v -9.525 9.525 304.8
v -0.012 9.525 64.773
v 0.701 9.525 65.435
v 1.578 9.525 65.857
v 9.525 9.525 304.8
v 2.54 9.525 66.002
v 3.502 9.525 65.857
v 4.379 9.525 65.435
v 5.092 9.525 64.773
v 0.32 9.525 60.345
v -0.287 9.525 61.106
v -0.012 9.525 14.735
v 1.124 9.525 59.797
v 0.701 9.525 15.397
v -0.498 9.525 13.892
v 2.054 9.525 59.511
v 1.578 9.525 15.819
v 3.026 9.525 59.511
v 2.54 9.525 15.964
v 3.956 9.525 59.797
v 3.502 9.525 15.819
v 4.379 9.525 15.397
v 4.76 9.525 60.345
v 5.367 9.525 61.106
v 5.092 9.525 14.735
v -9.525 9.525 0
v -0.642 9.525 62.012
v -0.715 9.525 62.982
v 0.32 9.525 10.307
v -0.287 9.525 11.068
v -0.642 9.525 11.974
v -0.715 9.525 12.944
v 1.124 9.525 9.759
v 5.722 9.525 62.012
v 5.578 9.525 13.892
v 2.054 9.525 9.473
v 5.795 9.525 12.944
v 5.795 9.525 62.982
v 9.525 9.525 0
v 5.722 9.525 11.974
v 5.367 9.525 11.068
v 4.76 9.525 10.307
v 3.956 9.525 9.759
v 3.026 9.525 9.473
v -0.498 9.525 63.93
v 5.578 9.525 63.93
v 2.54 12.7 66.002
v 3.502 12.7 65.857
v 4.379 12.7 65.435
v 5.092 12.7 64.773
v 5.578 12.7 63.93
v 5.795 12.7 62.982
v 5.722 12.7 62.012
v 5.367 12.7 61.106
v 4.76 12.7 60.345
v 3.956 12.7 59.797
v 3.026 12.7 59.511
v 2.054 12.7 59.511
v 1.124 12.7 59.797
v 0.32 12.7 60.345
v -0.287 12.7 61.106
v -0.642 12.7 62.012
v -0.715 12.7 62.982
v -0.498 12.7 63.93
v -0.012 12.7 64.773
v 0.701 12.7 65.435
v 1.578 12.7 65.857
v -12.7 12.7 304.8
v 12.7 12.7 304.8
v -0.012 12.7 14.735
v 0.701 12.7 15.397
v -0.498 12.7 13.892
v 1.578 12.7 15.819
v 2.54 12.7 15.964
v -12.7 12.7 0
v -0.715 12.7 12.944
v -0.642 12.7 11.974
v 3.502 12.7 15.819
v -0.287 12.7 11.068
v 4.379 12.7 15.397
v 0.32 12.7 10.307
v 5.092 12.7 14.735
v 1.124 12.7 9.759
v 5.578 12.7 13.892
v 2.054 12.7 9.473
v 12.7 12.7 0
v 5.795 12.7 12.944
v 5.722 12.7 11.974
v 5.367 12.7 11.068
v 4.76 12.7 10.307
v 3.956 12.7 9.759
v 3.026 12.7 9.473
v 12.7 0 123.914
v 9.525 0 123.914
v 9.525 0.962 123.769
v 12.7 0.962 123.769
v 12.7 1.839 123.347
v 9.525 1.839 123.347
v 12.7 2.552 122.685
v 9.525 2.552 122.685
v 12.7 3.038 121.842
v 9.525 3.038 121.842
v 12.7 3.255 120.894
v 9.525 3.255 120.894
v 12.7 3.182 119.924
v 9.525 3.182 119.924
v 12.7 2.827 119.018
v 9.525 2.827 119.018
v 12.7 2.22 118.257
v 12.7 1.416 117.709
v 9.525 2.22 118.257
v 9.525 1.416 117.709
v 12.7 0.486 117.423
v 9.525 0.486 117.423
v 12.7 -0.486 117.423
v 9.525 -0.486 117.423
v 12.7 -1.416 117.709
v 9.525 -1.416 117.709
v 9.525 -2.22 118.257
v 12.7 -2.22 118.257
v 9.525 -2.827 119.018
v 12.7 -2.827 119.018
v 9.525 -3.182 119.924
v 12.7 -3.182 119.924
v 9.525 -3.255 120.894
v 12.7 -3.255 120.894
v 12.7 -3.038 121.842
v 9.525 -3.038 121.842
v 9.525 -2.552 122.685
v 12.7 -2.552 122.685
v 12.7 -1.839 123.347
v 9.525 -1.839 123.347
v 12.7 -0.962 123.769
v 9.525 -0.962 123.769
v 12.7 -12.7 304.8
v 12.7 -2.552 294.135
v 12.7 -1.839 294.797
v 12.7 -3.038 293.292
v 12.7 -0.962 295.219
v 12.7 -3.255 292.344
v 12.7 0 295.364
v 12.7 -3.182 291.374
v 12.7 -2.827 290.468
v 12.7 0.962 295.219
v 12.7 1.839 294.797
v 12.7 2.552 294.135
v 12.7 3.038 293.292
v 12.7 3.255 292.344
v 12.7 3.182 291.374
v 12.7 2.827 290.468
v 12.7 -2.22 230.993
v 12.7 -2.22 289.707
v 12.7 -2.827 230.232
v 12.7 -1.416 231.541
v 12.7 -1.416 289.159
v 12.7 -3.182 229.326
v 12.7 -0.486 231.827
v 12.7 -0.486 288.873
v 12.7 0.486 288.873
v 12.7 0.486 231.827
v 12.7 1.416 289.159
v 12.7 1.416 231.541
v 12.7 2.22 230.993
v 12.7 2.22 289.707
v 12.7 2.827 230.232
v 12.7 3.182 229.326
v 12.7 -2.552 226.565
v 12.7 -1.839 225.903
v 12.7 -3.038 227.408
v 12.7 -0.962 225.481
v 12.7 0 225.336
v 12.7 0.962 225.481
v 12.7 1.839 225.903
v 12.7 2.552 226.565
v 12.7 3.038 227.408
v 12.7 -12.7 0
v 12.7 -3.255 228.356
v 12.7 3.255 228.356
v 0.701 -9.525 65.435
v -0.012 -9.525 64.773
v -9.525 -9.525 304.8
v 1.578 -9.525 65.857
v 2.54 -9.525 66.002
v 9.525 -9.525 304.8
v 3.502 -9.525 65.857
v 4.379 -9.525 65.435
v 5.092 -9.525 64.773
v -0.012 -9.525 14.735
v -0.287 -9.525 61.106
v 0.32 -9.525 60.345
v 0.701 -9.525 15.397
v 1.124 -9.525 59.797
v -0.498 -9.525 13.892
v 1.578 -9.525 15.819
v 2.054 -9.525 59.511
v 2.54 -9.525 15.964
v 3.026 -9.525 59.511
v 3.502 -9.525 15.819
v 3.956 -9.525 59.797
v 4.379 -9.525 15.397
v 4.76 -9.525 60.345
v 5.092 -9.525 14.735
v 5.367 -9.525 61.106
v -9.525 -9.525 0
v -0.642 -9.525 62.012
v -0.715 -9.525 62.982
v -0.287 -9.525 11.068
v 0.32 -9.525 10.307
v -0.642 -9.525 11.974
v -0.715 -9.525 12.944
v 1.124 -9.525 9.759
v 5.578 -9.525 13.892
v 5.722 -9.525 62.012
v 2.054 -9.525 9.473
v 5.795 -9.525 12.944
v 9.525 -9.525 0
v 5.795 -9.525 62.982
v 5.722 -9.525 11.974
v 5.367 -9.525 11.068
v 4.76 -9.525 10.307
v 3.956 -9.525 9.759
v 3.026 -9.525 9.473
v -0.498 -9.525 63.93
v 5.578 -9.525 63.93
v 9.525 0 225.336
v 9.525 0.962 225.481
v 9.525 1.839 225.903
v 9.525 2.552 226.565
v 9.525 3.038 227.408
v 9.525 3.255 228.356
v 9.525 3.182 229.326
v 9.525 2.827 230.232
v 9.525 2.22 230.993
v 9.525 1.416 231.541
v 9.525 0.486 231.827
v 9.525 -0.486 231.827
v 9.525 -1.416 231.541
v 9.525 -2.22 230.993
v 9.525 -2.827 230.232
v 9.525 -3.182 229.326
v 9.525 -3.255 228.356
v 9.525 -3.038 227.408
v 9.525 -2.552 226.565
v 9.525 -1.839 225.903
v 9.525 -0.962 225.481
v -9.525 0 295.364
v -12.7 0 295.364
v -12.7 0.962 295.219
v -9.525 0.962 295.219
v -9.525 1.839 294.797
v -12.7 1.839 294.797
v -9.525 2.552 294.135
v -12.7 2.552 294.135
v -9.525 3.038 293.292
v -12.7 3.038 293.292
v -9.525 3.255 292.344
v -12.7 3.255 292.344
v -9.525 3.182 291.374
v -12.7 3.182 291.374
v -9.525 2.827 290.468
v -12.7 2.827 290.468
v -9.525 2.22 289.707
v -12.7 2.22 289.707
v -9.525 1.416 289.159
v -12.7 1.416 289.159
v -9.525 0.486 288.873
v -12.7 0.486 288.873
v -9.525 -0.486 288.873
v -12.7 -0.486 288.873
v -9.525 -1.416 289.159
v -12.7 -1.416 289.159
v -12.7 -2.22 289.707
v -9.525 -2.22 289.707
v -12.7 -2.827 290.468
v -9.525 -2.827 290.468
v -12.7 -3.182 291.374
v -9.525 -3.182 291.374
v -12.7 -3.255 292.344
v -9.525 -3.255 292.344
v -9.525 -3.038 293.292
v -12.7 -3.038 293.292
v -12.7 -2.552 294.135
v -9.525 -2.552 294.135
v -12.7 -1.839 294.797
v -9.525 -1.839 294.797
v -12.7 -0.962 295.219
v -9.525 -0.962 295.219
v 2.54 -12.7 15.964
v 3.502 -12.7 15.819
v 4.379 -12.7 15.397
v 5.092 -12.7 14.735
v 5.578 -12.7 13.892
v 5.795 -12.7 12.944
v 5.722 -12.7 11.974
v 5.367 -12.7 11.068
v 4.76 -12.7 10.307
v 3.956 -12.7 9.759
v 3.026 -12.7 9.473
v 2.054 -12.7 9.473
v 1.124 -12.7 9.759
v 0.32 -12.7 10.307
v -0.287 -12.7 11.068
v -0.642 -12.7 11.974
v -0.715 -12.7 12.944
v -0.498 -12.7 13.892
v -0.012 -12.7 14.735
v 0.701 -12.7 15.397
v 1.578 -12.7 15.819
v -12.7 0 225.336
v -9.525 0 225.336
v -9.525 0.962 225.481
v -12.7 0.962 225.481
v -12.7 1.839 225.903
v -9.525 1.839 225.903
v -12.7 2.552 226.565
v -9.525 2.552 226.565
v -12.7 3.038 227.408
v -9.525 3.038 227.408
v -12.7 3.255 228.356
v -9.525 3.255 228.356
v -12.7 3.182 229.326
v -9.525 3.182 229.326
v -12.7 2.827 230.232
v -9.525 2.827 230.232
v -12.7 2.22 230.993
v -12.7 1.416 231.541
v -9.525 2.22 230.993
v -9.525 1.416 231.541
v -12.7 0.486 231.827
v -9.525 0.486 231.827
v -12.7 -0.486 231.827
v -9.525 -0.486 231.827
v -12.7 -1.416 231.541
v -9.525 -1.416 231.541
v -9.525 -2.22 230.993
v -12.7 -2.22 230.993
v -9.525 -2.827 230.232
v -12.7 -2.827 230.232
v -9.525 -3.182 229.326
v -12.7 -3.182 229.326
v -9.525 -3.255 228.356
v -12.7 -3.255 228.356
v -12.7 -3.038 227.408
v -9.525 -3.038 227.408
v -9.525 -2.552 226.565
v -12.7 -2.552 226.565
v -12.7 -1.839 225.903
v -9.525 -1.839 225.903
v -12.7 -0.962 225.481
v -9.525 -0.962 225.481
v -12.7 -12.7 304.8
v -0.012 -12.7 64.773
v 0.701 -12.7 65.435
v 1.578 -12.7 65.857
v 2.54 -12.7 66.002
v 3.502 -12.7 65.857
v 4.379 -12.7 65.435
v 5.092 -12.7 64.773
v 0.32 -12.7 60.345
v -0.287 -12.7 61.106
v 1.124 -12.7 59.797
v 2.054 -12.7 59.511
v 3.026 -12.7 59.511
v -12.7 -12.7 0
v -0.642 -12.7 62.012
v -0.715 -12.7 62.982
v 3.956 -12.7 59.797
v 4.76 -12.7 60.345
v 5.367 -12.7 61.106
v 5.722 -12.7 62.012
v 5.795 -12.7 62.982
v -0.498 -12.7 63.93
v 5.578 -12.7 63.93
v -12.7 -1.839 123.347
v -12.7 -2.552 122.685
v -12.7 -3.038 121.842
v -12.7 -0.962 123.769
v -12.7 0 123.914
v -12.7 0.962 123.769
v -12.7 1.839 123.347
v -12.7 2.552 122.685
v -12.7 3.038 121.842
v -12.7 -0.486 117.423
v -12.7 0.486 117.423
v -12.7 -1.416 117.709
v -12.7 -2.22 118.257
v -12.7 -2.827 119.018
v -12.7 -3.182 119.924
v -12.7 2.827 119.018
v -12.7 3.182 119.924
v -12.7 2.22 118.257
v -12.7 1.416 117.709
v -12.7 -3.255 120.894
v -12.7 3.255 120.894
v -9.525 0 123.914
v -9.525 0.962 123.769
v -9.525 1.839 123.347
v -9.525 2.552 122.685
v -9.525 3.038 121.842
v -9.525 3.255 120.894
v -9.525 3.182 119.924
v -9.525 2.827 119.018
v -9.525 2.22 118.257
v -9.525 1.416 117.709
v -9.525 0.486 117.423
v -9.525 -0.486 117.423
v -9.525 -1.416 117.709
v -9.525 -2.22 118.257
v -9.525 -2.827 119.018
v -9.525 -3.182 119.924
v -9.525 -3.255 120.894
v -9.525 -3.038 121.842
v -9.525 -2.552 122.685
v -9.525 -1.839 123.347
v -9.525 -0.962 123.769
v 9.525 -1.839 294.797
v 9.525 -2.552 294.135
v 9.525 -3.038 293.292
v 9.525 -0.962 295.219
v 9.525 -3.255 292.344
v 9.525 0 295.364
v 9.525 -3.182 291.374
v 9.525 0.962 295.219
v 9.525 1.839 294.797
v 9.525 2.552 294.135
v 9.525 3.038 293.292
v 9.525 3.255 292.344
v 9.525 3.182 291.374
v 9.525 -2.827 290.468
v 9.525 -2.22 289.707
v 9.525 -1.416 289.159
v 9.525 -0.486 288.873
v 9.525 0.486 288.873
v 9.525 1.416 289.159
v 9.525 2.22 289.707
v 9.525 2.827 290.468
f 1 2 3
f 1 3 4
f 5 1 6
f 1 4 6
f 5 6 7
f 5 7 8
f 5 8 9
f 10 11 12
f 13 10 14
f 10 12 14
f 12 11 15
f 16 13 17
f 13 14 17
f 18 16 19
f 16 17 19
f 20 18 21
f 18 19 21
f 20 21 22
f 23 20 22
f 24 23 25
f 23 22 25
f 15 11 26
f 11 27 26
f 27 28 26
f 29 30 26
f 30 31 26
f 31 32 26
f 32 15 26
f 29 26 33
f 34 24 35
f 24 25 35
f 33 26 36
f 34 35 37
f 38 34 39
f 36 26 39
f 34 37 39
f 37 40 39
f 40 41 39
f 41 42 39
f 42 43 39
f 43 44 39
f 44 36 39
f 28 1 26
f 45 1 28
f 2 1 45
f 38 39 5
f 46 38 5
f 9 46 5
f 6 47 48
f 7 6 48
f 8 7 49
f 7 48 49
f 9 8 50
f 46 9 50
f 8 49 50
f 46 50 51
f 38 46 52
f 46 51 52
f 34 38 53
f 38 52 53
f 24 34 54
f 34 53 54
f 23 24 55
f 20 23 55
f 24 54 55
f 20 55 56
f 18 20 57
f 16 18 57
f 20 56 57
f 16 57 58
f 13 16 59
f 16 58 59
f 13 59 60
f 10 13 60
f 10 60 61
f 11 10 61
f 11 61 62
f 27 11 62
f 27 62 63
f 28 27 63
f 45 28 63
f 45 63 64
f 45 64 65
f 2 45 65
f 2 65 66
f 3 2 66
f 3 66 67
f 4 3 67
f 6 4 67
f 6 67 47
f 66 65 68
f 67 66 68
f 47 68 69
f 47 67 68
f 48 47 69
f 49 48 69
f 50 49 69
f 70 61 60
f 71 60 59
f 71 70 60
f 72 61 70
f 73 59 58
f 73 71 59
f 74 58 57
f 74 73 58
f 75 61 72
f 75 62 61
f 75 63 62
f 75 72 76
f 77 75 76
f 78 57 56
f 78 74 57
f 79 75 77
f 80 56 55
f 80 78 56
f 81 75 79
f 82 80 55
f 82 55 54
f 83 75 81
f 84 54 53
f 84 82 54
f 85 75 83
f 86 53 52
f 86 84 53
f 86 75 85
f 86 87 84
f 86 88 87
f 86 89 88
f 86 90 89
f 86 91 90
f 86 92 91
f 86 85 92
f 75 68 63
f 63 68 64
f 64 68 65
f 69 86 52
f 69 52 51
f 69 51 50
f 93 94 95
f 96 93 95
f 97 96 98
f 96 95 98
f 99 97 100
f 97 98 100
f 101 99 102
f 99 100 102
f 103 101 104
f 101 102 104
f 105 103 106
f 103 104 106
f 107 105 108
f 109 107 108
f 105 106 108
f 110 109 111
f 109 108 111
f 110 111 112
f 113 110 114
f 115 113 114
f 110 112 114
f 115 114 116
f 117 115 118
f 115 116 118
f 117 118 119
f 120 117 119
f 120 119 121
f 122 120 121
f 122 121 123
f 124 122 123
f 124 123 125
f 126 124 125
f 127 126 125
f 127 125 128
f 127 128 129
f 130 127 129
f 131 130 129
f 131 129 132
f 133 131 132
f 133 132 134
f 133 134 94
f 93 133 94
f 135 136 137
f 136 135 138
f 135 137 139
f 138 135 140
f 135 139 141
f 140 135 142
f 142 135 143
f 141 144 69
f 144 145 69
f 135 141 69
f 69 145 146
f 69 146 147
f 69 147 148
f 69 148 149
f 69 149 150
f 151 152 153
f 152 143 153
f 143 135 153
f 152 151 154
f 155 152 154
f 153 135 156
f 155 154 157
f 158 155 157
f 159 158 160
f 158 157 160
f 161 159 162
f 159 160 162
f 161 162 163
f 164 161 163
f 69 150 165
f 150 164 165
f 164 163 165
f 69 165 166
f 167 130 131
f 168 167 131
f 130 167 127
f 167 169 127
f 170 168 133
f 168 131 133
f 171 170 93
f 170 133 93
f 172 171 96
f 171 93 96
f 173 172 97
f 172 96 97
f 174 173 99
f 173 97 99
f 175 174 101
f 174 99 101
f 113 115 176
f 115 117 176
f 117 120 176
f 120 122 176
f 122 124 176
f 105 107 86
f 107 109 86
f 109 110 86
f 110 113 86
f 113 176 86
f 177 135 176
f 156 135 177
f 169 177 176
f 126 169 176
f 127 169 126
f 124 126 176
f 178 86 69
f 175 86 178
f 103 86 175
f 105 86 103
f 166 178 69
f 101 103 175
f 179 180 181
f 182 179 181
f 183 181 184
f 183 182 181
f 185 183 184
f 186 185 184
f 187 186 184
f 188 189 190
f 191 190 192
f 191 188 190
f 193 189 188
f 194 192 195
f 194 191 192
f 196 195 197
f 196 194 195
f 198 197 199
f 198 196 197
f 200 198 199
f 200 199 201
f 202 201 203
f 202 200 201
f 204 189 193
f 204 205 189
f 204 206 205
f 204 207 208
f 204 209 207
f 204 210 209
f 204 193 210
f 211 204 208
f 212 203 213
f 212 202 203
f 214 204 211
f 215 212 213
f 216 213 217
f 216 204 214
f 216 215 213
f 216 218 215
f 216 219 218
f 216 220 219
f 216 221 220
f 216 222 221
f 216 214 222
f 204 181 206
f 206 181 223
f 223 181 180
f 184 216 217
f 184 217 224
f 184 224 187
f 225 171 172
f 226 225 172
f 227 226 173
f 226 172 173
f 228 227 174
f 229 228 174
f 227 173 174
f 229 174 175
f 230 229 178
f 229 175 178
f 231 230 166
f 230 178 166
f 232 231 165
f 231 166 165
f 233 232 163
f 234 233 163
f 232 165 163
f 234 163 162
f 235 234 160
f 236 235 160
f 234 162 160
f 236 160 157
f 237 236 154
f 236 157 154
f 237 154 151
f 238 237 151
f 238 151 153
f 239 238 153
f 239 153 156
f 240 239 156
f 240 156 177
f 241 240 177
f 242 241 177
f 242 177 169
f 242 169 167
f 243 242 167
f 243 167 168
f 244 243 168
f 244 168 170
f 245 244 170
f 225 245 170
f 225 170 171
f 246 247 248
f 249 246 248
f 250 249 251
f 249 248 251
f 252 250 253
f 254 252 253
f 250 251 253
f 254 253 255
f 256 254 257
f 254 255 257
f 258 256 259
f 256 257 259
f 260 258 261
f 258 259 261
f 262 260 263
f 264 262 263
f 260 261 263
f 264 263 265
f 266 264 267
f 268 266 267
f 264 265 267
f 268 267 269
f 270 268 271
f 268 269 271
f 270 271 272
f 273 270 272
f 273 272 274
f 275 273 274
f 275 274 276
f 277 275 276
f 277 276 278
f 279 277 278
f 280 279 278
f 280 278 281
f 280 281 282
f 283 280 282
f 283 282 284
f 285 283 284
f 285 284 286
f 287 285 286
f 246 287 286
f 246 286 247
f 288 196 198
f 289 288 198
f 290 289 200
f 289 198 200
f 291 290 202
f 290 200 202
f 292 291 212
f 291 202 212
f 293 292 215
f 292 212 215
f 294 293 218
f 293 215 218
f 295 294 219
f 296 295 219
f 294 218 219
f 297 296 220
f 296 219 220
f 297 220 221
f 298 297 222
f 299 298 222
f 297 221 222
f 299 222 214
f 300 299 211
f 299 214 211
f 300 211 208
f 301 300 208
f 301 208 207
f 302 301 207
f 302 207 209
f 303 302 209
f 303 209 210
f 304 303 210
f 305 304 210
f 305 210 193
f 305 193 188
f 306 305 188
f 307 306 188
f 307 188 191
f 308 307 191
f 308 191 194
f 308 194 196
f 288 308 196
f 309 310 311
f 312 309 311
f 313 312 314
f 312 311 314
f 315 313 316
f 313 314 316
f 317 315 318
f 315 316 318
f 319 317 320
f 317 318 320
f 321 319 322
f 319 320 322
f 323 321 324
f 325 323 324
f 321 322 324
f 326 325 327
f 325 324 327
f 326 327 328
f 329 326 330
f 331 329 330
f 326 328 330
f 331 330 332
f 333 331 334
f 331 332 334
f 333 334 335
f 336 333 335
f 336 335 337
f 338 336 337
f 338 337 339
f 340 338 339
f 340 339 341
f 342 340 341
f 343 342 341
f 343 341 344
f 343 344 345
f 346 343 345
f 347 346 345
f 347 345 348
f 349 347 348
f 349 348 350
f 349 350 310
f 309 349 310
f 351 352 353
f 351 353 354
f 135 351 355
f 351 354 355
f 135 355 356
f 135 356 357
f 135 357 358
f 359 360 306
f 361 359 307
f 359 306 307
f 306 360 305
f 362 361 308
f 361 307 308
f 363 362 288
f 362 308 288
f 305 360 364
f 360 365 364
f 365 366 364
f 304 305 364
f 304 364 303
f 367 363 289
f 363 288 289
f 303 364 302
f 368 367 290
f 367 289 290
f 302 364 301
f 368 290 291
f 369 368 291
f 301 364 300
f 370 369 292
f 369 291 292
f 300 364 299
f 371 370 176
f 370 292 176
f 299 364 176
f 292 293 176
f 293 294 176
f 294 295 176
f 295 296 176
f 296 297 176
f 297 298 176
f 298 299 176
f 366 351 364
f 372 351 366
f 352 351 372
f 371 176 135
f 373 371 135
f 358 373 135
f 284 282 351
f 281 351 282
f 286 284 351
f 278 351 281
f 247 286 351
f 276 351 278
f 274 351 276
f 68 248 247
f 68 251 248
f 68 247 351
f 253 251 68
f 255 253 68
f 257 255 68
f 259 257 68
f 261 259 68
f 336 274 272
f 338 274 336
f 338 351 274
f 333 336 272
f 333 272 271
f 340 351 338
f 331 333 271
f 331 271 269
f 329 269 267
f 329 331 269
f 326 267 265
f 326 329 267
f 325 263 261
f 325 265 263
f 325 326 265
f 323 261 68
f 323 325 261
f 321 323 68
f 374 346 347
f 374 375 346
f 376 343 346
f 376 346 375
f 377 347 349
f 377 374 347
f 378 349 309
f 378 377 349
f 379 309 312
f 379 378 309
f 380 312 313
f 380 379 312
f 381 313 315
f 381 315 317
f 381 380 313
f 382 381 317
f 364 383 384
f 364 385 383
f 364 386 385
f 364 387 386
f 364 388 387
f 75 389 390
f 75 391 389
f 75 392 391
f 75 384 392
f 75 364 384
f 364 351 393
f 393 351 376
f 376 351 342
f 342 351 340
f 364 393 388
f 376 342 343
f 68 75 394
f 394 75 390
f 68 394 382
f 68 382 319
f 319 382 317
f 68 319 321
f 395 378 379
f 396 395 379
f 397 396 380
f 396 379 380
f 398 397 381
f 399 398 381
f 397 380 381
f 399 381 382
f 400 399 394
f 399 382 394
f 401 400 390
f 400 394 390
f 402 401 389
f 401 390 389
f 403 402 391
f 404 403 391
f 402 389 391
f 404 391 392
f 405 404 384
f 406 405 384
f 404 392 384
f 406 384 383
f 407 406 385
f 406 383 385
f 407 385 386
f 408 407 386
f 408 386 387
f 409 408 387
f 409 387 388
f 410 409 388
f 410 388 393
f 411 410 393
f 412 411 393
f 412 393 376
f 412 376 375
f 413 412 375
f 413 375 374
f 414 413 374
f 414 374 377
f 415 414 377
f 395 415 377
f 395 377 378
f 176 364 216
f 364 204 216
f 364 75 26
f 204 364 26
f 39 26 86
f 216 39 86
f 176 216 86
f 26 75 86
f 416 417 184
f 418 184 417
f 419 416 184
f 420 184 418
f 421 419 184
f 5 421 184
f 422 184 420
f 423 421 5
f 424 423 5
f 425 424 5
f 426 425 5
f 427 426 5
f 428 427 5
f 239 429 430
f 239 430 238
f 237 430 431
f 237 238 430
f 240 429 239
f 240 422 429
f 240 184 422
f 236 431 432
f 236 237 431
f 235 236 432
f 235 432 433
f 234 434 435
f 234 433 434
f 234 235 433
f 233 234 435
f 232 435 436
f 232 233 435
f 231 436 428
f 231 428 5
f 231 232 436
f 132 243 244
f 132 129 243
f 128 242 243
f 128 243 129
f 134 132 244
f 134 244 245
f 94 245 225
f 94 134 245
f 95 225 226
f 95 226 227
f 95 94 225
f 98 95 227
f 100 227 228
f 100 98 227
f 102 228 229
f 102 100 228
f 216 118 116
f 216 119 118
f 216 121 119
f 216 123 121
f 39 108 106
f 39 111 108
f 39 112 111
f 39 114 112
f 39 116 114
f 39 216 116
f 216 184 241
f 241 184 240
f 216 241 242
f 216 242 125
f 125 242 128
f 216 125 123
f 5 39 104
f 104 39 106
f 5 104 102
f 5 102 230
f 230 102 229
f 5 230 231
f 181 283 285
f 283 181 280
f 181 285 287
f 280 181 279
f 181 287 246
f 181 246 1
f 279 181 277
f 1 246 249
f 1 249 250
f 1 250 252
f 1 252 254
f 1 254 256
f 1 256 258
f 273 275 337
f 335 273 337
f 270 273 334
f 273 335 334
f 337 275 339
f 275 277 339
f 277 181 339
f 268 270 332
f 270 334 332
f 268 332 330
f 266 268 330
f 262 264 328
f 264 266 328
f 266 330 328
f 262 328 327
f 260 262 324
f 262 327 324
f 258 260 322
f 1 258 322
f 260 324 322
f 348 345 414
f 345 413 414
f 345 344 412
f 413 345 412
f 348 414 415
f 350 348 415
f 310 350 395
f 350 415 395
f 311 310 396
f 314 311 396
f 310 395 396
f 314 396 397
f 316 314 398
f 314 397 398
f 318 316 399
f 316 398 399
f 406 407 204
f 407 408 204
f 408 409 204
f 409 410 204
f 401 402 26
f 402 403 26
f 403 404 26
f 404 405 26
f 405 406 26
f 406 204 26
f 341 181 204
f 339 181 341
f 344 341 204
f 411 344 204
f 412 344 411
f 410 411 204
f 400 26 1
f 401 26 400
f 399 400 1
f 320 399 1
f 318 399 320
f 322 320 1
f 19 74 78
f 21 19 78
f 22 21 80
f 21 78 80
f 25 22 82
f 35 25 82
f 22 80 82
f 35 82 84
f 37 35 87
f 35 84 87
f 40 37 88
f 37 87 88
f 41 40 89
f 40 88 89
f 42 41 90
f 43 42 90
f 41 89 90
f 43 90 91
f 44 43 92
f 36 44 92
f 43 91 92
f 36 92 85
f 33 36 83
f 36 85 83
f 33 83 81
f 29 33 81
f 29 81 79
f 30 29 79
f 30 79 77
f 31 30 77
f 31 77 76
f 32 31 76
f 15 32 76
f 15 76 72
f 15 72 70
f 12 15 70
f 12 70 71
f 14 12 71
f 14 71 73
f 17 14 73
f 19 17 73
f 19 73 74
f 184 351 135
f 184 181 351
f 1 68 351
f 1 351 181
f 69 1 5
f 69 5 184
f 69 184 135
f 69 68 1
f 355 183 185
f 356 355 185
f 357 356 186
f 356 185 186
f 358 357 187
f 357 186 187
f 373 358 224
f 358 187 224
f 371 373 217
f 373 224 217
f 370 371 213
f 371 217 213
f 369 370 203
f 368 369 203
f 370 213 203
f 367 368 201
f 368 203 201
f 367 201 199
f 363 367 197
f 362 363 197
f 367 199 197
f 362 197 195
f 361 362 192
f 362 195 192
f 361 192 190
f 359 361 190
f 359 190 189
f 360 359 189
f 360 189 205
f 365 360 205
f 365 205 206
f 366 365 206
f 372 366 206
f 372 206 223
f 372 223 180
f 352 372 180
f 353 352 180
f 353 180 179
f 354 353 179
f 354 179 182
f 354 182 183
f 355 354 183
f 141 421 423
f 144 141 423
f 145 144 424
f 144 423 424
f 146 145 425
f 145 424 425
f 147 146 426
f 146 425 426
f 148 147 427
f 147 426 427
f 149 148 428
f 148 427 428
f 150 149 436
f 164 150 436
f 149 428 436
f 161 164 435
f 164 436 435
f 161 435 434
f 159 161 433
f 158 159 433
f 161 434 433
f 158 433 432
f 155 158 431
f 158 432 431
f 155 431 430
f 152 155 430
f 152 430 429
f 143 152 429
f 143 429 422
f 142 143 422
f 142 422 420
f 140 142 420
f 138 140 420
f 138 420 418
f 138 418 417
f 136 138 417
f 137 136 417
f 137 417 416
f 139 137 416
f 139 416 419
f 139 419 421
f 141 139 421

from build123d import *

# Parameters (mm, degrees)
SKETCH2_W           = 25.4
SKETCH2_H           = 25.4
BOSS_EXTRUDE1_DEPTH = 304.8
SKETCH4_W           = 19.05
SKETCH4_H           = 19.05
CUT_EXTRUDE1_DEPTH  = 306.328708116
SKETCH5_R           = 3.2639
CUT_EXTRUDE2_DEPTH  = 304.8
SKETCH6_R           = 3.2639
CUT_EXTRUDE3_DEPTH  = 304.8
SKETCH8_R           = 3.2639
CUT_EXTRUDE5_DEPTH  = 307.120058147
SKETCH9_R           = 3.2639
CUT_EXTRUDE6_DEPTH  = 307.120058147
SKETCH10_R          = 3.2639
CUT_EXTRUDE7_DEPTH  = 307.120058147


with BuildPart() as part:
    # Sketch2 → Boss-Extrude1 (new body)
    with BuildSketch(Plane.XY):
        Rectangle(SKETCH2_W, SKETCH2_H)
    extrude(amount=BOSS_EXTRUDE1_DEPTH)

    # Sketch4 → Cut-Extrude1 (cut, through all)
    with BuildSketch(Plane.XY):
        Rectangle(SKETCH4_W, SKETCH4_H)
    extrude(amount=CUT_EXTRUDE1_DEPTH, mode=Mode.SUBTRACT)

    # Sketch5 → Cut-Extrude2 (cut)
    with BuildSketch(Plane(origin=(0, 12.7, 0), x_dir=(1, 0, 0), z_dir=(0, 1, 0))):
        with Locations(Location((2.54, -12.7, 0), (0, 0, 270))):
            Circle(SKETCH5_R)
    extrude(amount=-CUT_EXTRUDE2_DEPTH, mode=Mode.SUBTRACT)

    # Sketch6 → Cut-Extrude3 (cut)
    with BuildSketch(Plane(origin=(0, 12.7, 0), x_dir=(1, 0, 0), z_dir=(0, 1, 0))):
        with Locations(Location((2.54, -62.738, 0), (0, 0, 270))):
            Circle(SKETCH6_R)
    extrude(amount=-CUT_EXTRUDE3_DEPTH, mode=Mode.SUBTRACT)

    # Sketch8 → Cut-Extrude5 (cut, through all)
    with BuildSketch(Plane.ZY.offset(12.7)):
        with Locations((292.1, 0)):
            Circle(SKETCH8_R)
    extrude(amount=-CUT_EXTRUDE5_DEPTH, mode=Mode.SUBTRACT)

    # Sketch9 → Cut-Extrude6 (cut, through all)
    with BuildSketch(Plane(origin=(12.7, 0, 0), x_dir=(0, 0, -1), z_dir=(1, 0, 0))):
        with Locations((-228.6, 0)):
            Circle(SKETCH9_R)
    extrude(amount=-CUT_EXTRUDE6_DEPTH, mode=Mode.SUBTRACT)

    # Sketch10 → Cut-Extrude7 (cut, through all)
    with BuildSketch(Plane.ZY.offset(12.7)):
        with Locations((120.65, 0)):
            Circle(SKETCH10_R)
    extrude(amount=-CUT_EXTRUDE7_DEPTH, mode=Mode.SUBTRACT)


solid = part.part
